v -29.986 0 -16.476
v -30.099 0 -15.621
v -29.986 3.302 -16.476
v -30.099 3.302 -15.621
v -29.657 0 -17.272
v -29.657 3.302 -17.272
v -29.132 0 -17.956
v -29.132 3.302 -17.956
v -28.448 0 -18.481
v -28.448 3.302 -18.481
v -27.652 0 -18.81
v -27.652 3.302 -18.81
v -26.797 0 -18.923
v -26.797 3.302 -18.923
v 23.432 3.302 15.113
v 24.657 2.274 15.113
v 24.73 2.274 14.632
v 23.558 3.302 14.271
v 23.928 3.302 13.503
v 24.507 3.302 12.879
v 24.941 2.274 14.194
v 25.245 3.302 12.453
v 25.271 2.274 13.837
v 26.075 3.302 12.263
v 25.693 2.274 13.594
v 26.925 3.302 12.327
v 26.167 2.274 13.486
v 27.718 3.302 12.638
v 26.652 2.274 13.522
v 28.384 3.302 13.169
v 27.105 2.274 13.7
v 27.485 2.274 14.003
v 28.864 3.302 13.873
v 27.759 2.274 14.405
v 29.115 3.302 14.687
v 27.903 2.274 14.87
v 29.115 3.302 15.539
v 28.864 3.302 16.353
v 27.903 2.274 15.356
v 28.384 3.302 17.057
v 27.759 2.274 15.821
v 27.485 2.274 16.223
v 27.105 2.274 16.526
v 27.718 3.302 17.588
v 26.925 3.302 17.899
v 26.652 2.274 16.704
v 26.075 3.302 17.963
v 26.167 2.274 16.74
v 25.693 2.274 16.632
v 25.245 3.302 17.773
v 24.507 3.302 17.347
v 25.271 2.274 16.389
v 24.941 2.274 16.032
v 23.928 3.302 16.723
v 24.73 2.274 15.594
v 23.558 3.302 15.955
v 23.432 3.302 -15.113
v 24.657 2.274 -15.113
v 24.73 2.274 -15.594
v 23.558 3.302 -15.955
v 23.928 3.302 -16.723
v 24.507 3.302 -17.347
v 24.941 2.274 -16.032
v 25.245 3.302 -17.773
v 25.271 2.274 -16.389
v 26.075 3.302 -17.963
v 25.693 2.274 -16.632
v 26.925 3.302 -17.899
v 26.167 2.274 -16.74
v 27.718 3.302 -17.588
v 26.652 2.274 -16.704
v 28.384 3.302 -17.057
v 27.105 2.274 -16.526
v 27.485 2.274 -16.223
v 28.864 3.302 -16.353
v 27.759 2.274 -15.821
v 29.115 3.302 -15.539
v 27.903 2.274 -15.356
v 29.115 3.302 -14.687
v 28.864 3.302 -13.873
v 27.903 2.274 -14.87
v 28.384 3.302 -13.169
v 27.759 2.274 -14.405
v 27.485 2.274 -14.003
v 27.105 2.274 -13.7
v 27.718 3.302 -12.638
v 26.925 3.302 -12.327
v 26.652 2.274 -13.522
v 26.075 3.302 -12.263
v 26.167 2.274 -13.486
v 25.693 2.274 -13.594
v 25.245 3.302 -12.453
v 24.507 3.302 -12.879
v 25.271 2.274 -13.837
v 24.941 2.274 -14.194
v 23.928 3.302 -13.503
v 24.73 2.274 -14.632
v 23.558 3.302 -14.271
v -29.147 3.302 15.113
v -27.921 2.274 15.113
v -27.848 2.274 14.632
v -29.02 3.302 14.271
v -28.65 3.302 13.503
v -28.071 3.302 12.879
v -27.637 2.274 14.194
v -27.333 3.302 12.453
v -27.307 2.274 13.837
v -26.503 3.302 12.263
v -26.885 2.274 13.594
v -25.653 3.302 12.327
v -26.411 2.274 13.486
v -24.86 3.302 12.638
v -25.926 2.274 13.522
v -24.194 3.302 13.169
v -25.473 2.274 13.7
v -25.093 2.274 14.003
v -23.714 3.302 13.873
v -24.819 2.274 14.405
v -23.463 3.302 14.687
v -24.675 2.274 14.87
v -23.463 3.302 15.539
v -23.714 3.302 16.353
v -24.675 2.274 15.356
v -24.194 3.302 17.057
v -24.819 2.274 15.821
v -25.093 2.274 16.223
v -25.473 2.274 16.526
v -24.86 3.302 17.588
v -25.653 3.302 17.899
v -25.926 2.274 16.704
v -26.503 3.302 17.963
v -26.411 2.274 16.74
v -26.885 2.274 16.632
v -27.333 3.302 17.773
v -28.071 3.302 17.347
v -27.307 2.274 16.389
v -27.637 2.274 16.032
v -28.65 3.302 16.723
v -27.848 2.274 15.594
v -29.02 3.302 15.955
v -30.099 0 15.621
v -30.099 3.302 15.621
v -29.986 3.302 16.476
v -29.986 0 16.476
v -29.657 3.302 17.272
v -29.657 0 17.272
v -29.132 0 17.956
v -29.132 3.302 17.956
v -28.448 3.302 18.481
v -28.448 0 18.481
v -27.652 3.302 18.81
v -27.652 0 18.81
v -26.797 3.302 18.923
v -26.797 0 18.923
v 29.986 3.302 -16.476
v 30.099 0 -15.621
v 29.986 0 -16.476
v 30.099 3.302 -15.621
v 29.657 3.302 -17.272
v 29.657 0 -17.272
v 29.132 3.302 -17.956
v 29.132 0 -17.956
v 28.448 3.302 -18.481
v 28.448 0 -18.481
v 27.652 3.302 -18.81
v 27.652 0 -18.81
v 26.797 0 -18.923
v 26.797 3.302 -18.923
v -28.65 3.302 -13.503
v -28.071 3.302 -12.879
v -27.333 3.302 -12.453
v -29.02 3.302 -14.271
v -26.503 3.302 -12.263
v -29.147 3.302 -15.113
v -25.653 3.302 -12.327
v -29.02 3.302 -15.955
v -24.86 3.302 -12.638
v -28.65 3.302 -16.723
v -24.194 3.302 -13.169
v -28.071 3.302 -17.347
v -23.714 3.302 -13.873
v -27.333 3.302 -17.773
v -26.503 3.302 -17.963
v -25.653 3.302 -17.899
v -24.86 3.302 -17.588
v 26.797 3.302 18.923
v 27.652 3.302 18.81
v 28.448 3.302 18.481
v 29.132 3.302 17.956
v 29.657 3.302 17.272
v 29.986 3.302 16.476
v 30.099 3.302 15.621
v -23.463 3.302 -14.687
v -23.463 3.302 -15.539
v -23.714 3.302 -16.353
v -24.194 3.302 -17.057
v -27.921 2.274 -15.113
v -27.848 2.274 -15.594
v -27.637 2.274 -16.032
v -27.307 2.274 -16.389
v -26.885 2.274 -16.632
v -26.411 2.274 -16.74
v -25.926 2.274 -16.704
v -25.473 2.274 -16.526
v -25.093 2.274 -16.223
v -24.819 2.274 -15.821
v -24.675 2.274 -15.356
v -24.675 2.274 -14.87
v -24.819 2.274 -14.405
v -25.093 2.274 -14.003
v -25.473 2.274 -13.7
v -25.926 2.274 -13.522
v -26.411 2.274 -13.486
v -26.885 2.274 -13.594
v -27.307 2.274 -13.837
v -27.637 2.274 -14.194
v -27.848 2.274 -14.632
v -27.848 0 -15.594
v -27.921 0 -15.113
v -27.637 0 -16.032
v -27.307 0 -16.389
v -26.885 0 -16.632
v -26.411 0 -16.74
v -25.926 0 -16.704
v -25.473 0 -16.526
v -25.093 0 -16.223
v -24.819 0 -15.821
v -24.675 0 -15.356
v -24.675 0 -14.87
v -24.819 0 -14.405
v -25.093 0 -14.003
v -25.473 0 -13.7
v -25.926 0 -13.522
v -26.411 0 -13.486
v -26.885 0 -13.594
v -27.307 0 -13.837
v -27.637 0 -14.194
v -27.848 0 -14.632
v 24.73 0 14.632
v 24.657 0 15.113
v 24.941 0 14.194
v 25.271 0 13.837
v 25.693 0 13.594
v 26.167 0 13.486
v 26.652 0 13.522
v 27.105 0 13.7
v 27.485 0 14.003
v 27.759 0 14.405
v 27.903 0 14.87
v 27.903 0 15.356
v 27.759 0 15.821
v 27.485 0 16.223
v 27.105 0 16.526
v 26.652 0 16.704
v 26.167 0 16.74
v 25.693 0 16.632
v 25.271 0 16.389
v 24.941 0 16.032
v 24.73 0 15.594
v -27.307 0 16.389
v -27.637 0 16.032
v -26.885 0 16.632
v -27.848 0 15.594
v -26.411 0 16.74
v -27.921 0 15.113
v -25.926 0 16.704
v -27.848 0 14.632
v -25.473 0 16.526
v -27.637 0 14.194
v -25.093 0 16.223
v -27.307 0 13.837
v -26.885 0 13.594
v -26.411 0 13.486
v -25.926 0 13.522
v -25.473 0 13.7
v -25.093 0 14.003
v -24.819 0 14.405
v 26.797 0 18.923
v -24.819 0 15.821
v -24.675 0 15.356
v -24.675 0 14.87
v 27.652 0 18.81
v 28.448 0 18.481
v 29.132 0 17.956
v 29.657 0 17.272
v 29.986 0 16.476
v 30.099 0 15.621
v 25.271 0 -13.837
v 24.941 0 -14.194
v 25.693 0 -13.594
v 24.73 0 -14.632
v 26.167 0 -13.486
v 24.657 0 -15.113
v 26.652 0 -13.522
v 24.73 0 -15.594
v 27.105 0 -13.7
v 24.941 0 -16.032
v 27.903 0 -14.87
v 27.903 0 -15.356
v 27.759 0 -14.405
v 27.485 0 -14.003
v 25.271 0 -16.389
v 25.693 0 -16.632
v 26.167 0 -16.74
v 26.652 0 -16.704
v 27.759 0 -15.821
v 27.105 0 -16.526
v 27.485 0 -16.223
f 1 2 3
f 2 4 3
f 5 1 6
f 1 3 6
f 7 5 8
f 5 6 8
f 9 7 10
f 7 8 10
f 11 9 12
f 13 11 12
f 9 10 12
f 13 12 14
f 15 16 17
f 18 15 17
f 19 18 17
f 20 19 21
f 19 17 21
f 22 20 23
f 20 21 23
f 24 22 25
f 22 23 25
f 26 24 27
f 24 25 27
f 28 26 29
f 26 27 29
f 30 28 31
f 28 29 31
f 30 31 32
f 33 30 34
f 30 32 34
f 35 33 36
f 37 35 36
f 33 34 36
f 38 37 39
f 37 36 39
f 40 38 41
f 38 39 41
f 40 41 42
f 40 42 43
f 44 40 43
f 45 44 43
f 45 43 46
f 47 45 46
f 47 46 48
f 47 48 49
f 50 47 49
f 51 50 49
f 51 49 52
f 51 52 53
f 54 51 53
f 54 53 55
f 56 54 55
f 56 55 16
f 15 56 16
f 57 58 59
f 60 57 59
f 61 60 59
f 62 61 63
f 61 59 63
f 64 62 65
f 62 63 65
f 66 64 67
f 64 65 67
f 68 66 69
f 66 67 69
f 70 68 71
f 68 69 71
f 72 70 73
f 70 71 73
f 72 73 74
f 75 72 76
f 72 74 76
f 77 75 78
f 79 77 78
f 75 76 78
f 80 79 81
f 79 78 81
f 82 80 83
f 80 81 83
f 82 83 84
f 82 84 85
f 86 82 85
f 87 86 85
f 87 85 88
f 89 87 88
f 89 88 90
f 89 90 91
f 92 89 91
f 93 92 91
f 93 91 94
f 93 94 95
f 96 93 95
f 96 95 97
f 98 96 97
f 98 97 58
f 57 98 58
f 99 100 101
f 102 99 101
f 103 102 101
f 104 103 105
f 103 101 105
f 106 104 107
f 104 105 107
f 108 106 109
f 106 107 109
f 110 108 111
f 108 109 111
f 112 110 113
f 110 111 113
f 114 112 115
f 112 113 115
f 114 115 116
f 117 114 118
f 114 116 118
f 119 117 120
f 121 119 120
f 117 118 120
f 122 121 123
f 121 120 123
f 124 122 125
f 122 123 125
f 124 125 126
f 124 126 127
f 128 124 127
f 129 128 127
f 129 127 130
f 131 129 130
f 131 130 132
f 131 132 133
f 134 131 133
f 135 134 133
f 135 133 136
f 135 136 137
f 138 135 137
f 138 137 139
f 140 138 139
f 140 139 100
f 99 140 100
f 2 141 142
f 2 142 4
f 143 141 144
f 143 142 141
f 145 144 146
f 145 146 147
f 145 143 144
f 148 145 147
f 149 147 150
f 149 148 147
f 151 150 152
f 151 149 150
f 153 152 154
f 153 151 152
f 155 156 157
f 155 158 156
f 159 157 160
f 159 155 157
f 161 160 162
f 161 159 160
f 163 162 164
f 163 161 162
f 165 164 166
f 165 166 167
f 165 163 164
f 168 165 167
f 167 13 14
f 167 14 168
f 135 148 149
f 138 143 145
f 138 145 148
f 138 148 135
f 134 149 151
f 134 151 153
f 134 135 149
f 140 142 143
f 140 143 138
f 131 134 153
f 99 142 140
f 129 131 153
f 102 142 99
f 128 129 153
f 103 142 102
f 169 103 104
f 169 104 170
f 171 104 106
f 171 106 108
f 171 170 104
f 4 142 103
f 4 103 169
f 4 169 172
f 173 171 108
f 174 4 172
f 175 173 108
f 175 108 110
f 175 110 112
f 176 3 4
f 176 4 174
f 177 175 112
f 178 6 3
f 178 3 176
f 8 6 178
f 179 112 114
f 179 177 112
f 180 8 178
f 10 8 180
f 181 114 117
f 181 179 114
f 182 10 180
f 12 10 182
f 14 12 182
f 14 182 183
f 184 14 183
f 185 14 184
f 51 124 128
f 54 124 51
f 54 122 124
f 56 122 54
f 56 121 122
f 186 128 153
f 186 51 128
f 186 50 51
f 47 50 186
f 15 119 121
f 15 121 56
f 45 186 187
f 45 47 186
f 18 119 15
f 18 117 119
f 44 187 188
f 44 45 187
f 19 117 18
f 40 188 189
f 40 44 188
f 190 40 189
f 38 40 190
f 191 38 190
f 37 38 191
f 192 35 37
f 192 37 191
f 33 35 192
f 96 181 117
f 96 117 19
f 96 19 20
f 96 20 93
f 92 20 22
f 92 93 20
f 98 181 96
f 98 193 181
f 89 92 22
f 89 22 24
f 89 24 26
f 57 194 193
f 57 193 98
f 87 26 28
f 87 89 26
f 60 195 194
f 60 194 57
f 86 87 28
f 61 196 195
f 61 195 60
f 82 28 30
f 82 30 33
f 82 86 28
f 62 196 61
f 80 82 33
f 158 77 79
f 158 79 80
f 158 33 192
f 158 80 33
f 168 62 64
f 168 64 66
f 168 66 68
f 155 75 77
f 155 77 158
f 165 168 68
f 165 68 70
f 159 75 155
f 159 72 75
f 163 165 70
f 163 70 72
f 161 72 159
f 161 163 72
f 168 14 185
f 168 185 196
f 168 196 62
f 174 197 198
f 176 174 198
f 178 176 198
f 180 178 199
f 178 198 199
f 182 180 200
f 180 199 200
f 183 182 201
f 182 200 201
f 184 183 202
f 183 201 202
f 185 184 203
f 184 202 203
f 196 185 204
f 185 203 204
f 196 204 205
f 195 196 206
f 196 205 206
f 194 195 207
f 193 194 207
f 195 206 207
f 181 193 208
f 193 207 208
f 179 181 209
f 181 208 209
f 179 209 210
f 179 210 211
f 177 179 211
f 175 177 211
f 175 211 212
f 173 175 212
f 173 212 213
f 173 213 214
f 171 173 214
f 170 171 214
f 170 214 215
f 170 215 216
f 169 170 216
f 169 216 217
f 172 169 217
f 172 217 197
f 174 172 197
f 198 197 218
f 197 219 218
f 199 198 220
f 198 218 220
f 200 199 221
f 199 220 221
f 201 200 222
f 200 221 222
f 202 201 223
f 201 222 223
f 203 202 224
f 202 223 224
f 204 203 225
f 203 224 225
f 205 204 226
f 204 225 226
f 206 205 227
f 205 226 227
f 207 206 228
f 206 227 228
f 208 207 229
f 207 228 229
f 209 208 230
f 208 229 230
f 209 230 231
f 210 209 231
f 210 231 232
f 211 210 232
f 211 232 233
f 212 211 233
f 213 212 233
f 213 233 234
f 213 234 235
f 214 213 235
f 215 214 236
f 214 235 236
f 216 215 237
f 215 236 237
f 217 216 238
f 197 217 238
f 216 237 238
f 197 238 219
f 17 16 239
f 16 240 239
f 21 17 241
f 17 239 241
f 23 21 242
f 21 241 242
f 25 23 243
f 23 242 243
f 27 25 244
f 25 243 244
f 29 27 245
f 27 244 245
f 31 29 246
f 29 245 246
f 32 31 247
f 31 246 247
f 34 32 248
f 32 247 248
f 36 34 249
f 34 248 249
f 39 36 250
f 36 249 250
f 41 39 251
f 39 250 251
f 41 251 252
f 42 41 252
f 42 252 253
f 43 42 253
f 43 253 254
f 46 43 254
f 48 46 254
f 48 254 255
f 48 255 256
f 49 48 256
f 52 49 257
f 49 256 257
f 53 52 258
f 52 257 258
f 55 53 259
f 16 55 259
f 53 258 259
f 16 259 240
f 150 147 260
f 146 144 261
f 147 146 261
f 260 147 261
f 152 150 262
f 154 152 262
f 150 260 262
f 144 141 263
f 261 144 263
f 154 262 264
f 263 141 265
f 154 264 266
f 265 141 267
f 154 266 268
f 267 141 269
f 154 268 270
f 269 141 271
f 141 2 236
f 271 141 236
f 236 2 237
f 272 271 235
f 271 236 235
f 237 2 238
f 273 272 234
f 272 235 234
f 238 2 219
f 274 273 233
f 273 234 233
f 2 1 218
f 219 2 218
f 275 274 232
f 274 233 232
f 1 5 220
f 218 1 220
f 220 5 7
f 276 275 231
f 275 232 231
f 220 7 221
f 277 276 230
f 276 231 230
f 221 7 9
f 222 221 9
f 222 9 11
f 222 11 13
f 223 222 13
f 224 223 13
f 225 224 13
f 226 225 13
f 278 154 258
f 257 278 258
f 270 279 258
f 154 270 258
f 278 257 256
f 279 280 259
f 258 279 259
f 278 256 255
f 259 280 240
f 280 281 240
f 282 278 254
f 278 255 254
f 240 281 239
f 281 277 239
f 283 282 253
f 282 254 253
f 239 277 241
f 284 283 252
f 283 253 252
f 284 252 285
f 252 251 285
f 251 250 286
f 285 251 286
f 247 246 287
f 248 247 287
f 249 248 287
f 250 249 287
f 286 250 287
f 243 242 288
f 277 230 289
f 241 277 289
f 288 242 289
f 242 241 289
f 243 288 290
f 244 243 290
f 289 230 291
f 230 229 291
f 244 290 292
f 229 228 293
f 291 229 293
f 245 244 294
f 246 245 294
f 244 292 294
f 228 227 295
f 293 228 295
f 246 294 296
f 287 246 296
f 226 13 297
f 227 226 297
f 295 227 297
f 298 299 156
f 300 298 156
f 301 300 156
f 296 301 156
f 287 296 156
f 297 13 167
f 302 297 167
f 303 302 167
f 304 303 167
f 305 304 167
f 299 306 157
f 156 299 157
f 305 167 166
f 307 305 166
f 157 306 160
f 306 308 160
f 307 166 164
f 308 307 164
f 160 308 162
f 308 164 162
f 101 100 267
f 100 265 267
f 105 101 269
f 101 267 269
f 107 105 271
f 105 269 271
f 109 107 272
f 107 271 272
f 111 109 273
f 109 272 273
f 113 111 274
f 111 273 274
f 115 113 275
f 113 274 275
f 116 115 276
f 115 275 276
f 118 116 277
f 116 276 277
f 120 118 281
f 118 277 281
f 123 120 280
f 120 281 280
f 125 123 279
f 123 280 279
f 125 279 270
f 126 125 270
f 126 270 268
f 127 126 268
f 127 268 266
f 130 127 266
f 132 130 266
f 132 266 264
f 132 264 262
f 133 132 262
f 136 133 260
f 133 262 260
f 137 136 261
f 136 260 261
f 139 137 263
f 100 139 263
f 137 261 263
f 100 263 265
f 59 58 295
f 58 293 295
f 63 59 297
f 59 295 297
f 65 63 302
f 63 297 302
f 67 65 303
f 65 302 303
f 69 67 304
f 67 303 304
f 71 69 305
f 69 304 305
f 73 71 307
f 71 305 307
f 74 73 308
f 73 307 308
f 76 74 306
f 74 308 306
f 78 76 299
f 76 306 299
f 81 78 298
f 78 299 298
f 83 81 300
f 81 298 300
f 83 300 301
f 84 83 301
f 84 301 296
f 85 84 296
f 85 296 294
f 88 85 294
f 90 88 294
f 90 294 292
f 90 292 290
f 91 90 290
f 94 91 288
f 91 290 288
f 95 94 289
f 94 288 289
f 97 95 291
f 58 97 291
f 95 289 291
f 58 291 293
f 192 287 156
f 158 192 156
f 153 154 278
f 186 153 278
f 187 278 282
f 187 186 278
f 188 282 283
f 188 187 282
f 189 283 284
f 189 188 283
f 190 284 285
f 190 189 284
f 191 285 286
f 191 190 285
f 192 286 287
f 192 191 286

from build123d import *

# Parameters (mm, degrees)
SKETCH1_W                                         = 60.198
SKETCH1_H                                         = 37.846
BOSS_EXTRUDE1_DEPTH                               = 3.302
FILLET1_R                                         = 3.302
CSK_FOR_4_FLAT_HEAD_MACHINE_SCREW_100_D           = 3.2639
CSK_FOR_4_FLAT_HEAD_MACHINE_SCREW_100_CSINK_D     = 5.715
CSK_FOR_4_FLAT_HEAD_MACHINE_SCREW_100_CSINK_ANGLE = 100


with BuildPart() as part:
    # Sketch1 → Boss-Extrude1 (new body)
    with BuildSketch(Plane(origin=(0, 0, 0), x_dir=(1, 0, 0), z_dir=(0, 1, 0))):
        Rectangle(SKETCH1_W, SKETCH1_H)
    extrude(amount=BOSS_EXTRUDE1_DEPTH)

    # Fillet1
    fillet1_edges = [part.edges().sort_by_distance(p)[0] for p in [
        (30.099, 1.651, 18.923),
        (-30.099, 1.651, 18.923),
        (-30.099, 1.651, -18.923),
        (30.099, 1.651, -18.923),
    ]]
    fillet(fillet1_edges, radius=FILLET1_R)

    # CSK for #4 Flat Head Machine Screw (100)1 (through all)
    with Locations(Plane(origin=(0, 3.302, 0), x_dir=(1, 0, 0), z_dir=(0, 1, 0))):
        with Locations((-26.289, 15.113), (-26.289, -15.113), (26.289, -15.113), (26.289, 15.113)):
            CounterSinkHole(CSK_FOR_4_FLAT_HEAD_MACHINE_SCREW_100_D / 2, CSK_FOR_4_FLAT_HEAD_MACHINE_SCREW_100_CSINK_D / 2, counter_sink_angle=CSK_FOR_4_FLAT_HEAD_MACHINE_SCREW_100_CSINK_ANGLE)


solid = part.part
